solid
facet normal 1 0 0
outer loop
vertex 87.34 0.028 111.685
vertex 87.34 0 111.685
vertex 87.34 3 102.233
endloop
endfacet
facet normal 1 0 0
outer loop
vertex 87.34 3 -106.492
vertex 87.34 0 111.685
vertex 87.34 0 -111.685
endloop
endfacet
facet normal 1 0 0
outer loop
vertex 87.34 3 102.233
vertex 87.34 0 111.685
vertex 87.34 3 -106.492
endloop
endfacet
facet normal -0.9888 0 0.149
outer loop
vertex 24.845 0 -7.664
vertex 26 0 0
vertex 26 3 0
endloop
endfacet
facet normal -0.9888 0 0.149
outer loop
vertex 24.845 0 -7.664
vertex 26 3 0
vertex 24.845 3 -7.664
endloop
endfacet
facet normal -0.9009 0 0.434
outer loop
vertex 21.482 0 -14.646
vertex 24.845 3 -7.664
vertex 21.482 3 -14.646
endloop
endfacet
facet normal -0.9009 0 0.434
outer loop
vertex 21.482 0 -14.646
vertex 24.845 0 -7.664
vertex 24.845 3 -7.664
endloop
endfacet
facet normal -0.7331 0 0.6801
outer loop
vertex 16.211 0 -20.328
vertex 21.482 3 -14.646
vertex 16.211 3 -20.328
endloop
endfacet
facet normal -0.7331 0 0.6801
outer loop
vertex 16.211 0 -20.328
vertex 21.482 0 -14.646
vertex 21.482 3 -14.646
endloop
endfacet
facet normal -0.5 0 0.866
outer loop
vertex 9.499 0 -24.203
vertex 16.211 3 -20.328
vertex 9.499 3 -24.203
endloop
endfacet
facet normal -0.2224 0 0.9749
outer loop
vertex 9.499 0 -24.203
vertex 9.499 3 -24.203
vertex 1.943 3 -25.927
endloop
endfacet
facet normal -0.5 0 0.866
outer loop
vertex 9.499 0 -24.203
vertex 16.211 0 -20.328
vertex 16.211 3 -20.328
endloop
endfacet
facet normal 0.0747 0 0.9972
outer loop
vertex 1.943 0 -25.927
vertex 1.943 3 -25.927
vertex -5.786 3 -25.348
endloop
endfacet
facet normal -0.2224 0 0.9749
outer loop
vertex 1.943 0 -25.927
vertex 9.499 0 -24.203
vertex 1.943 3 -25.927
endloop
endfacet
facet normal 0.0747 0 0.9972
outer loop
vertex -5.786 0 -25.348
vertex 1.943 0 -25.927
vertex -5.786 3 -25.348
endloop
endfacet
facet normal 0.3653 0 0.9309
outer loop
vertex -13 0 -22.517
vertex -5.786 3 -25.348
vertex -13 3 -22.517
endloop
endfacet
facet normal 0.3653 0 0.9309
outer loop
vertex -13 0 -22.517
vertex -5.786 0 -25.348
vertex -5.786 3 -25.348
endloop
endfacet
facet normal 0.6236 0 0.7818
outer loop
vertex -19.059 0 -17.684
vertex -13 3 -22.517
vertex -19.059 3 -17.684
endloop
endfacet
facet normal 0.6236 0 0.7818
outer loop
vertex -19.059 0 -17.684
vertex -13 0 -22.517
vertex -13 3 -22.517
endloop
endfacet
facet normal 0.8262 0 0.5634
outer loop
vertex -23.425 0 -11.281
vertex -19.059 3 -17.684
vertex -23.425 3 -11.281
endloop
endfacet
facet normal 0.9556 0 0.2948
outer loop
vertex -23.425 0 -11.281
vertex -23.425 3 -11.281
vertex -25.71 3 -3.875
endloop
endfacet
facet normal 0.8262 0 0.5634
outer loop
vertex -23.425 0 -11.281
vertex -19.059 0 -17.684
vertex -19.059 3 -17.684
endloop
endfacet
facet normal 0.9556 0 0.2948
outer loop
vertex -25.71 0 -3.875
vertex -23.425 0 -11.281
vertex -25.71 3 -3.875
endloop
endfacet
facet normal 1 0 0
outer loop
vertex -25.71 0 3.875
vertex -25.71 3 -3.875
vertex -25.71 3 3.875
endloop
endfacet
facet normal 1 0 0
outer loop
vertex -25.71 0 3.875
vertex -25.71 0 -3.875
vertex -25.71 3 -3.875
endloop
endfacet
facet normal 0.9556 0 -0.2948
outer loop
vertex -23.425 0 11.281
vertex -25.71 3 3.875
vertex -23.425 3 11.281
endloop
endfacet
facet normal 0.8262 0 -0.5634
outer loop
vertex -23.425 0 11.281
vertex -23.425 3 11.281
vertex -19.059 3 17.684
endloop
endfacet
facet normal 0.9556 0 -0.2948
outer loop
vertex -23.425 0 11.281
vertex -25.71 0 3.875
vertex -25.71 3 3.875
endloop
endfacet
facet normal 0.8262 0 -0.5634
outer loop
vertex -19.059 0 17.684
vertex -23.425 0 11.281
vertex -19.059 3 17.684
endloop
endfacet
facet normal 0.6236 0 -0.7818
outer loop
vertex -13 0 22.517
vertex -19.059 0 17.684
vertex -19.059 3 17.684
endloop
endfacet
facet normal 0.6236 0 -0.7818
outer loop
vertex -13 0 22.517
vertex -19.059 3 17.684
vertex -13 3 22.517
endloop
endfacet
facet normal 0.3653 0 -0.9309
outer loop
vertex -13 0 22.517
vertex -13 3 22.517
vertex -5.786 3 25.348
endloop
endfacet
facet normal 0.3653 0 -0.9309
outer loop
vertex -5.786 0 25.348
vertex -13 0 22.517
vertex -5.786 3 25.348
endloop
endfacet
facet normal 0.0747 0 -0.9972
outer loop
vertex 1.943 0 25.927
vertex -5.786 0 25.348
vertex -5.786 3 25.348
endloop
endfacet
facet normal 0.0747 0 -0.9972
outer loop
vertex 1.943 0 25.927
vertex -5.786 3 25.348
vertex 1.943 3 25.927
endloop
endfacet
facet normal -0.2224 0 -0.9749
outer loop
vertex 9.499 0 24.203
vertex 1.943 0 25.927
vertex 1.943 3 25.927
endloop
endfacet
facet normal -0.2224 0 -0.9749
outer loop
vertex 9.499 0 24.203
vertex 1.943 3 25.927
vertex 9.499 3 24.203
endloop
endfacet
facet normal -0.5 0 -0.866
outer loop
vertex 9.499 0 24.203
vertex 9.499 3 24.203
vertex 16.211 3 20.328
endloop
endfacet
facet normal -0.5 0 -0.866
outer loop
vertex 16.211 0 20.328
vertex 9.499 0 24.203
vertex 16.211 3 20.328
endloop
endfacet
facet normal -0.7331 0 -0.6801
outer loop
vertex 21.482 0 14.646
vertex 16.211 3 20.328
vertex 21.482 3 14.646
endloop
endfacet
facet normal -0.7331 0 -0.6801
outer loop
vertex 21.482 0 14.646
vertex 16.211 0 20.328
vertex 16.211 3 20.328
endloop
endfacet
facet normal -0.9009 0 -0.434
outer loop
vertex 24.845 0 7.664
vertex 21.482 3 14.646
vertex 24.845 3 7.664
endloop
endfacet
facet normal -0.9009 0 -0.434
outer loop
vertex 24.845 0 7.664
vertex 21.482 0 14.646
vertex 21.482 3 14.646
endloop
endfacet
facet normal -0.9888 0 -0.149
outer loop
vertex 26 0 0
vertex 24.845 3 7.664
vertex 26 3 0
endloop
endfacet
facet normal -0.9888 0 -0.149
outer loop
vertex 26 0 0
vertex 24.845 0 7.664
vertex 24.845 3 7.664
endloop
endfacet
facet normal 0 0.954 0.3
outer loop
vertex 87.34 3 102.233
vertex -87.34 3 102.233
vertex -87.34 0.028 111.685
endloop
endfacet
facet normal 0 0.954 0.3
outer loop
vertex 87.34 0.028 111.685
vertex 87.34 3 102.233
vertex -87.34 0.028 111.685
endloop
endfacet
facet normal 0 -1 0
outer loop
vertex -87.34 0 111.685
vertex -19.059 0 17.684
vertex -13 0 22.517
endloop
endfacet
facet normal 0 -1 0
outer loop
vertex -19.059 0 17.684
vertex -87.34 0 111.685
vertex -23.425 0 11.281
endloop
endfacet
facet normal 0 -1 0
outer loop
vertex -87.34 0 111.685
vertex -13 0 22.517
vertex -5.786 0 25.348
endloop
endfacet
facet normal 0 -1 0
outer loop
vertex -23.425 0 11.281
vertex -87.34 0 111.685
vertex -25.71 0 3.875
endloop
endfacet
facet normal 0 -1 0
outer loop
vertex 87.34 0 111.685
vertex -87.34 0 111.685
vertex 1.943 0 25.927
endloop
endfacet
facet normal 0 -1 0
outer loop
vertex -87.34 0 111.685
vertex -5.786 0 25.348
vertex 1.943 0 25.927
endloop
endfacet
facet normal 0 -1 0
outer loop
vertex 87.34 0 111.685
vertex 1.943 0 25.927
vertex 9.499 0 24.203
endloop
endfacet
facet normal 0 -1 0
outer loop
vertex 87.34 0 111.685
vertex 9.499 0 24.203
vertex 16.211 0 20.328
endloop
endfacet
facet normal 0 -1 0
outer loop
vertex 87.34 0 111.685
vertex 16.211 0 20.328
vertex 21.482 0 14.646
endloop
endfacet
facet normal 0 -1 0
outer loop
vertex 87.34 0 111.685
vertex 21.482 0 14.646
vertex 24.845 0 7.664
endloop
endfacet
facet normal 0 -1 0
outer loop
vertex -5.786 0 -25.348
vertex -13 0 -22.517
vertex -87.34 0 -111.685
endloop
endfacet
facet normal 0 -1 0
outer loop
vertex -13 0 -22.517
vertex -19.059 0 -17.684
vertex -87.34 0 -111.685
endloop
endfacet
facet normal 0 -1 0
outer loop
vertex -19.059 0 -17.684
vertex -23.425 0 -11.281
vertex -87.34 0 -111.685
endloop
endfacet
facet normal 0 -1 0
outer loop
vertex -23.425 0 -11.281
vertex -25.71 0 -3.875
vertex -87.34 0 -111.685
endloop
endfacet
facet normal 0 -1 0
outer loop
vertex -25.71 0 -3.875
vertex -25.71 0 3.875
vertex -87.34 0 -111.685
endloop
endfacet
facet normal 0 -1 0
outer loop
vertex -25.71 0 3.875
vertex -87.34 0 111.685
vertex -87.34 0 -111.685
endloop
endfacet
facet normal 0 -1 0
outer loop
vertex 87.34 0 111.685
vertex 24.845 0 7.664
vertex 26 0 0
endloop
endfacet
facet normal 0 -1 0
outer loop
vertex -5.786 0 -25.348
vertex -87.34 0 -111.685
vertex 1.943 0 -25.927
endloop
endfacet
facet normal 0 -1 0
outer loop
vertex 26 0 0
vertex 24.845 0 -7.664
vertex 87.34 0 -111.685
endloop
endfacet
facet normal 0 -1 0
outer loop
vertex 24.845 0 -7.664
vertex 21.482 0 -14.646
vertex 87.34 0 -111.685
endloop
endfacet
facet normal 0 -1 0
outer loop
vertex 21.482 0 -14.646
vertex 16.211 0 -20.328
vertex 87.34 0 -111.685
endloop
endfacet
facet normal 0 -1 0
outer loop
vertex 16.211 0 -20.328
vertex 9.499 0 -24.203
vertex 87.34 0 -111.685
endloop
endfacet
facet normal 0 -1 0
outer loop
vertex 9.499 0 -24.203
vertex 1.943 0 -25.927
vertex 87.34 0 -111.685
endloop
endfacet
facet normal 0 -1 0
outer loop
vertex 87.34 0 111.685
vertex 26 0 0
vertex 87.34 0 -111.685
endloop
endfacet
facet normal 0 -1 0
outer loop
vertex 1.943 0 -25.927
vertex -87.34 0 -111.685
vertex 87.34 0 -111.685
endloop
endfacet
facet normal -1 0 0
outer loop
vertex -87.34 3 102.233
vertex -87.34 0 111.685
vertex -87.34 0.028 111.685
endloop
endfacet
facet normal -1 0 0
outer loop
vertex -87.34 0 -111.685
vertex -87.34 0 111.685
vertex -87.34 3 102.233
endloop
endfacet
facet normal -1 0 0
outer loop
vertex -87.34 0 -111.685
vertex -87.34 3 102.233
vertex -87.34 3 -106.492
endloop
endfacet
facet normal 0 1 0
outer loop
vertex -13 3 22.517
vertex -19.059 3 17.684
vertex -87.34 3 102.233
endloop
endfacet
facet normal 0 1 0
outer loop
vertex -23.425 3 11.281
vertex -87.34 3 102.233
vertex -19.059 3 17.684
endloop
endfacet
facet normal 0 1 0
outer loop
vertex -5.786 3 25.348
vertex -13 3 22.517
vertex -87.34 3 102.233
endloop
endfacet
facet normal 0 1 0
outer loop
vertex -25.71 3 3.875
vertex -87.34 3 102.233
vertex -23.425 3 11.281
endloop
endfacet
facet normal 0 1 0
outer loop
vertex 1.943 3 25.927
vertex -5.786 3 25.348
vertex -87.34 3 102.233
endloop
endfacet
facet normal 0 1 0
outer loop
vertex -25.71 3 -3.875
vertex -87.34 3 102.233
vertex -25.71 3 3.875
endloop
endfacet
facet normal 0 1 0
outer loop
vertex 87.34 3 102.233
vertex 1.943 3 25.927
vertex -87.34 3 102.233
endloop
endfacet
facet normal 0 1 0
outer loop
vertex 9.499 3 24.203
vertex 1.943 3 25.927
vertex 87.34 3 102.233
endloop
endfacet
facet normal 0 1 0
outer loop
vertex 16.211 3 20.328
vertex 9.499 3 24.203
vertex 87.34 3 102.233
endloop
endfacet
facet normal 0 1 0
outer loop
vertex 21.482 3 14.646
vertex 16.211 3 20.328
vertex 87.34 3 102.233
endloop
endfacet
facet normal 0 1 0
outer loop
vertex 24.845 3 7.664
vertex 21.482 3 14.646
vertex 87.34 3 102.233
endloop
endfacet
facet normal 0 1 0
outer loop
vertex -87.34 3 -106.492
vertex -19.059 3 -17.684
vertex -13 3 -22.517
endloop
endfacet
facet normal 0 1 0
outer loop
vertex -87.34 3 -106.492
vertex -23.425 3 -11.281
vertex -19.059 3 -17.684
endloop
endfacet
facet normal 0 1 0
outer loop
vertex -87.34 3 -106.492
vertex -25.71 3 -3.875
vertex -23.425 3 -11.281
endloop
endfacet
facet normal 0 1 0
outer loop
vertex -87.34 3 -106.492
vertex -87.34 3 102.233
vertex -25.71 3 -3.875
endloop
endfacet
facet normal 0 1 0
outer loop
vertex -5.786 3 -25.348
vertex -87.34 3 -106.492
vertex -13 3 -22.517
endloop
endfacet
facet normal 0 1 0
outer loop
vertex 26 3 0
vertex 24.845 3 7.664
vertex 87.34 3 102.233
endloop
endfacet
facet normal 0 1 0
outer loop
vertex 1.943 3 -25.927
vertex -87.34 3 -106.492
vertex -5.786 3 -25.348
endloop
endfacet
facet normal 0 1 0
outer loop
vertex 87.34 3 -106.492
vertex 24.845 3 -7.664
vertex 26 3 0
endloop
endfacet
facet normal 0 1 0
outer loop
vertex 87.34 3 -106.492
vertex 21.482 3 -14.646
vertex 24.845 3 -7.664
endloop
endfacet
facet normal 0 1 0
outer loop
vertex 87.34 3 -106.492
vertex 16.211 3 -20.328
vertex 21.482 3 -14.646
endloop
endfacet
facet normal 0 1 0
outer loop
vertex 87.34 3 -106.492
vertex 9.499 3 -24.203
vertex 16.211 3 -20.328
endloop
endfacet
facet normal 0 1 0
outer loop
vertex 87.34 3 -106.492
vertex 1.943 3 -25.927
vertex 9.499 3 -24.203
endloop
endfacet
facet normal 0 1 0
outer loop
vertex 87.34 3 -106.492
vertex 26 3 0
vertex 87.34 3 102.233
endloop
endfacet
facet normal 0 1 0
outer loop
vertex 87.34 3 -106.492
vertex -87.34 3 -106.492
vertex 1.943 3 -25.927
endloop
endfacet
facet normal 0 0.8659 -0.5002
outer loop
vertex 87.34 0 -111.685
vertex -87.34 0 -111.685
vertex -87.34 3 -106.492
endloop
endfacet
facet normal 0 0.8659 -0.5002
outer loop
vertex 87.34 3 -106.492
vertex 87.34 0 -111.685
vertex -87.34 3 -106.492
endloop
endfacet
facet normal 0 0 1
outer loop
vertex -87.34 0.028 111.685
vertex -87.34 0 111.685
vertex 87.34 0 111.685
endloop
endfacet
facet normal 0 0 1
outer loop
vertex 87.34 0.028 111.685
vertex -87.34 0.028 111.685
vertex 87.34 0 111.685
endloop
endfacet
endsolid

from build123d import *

# Parameters (mm, degrees)
ESQUISSE1_W             = 174.68
ESQUISSE1_H             = 223.37
ESQUISSE1_R             = 26
BOSS_EXTRU_1_DEPTH      = 3
ENL_V_MAT_EXTRU_1_DEPTH = 190


with BuildPart() as part:
    # Esquisse1 → Boss.-Extru.1 (new body)
    with BuildSketch(Plane(origin=(0, 0, 0), x_dir=(1, 0, 0), z_dir=(0, 1, 0))):
        Rectangle(ESQUISSE1_W, ESQUISSE1_H)
        Circle(ESQUISSE1_R, mode=Mode.SUBTRACT)
    extrude(amount=BOSS_EXTRU_1_DEPTH)

    # Esquisse2 → Enlèv. mat.-Extru.1 (cut)
    with BuildSketch(Plane.ZY.offset(87.34)):
        Polygon((-111.685, 0), (-106.491722689, 3), (-111.685, 3), align=None)
        Polygon((102.233000386, 3), (111.685, 0.028240342), (111.685, 3), align=None)
    extrude(amount=-ENL_V_MAT_EXTRU_1_DEPTH, mode=Mode.SUBTRACT)


solid = part.part
